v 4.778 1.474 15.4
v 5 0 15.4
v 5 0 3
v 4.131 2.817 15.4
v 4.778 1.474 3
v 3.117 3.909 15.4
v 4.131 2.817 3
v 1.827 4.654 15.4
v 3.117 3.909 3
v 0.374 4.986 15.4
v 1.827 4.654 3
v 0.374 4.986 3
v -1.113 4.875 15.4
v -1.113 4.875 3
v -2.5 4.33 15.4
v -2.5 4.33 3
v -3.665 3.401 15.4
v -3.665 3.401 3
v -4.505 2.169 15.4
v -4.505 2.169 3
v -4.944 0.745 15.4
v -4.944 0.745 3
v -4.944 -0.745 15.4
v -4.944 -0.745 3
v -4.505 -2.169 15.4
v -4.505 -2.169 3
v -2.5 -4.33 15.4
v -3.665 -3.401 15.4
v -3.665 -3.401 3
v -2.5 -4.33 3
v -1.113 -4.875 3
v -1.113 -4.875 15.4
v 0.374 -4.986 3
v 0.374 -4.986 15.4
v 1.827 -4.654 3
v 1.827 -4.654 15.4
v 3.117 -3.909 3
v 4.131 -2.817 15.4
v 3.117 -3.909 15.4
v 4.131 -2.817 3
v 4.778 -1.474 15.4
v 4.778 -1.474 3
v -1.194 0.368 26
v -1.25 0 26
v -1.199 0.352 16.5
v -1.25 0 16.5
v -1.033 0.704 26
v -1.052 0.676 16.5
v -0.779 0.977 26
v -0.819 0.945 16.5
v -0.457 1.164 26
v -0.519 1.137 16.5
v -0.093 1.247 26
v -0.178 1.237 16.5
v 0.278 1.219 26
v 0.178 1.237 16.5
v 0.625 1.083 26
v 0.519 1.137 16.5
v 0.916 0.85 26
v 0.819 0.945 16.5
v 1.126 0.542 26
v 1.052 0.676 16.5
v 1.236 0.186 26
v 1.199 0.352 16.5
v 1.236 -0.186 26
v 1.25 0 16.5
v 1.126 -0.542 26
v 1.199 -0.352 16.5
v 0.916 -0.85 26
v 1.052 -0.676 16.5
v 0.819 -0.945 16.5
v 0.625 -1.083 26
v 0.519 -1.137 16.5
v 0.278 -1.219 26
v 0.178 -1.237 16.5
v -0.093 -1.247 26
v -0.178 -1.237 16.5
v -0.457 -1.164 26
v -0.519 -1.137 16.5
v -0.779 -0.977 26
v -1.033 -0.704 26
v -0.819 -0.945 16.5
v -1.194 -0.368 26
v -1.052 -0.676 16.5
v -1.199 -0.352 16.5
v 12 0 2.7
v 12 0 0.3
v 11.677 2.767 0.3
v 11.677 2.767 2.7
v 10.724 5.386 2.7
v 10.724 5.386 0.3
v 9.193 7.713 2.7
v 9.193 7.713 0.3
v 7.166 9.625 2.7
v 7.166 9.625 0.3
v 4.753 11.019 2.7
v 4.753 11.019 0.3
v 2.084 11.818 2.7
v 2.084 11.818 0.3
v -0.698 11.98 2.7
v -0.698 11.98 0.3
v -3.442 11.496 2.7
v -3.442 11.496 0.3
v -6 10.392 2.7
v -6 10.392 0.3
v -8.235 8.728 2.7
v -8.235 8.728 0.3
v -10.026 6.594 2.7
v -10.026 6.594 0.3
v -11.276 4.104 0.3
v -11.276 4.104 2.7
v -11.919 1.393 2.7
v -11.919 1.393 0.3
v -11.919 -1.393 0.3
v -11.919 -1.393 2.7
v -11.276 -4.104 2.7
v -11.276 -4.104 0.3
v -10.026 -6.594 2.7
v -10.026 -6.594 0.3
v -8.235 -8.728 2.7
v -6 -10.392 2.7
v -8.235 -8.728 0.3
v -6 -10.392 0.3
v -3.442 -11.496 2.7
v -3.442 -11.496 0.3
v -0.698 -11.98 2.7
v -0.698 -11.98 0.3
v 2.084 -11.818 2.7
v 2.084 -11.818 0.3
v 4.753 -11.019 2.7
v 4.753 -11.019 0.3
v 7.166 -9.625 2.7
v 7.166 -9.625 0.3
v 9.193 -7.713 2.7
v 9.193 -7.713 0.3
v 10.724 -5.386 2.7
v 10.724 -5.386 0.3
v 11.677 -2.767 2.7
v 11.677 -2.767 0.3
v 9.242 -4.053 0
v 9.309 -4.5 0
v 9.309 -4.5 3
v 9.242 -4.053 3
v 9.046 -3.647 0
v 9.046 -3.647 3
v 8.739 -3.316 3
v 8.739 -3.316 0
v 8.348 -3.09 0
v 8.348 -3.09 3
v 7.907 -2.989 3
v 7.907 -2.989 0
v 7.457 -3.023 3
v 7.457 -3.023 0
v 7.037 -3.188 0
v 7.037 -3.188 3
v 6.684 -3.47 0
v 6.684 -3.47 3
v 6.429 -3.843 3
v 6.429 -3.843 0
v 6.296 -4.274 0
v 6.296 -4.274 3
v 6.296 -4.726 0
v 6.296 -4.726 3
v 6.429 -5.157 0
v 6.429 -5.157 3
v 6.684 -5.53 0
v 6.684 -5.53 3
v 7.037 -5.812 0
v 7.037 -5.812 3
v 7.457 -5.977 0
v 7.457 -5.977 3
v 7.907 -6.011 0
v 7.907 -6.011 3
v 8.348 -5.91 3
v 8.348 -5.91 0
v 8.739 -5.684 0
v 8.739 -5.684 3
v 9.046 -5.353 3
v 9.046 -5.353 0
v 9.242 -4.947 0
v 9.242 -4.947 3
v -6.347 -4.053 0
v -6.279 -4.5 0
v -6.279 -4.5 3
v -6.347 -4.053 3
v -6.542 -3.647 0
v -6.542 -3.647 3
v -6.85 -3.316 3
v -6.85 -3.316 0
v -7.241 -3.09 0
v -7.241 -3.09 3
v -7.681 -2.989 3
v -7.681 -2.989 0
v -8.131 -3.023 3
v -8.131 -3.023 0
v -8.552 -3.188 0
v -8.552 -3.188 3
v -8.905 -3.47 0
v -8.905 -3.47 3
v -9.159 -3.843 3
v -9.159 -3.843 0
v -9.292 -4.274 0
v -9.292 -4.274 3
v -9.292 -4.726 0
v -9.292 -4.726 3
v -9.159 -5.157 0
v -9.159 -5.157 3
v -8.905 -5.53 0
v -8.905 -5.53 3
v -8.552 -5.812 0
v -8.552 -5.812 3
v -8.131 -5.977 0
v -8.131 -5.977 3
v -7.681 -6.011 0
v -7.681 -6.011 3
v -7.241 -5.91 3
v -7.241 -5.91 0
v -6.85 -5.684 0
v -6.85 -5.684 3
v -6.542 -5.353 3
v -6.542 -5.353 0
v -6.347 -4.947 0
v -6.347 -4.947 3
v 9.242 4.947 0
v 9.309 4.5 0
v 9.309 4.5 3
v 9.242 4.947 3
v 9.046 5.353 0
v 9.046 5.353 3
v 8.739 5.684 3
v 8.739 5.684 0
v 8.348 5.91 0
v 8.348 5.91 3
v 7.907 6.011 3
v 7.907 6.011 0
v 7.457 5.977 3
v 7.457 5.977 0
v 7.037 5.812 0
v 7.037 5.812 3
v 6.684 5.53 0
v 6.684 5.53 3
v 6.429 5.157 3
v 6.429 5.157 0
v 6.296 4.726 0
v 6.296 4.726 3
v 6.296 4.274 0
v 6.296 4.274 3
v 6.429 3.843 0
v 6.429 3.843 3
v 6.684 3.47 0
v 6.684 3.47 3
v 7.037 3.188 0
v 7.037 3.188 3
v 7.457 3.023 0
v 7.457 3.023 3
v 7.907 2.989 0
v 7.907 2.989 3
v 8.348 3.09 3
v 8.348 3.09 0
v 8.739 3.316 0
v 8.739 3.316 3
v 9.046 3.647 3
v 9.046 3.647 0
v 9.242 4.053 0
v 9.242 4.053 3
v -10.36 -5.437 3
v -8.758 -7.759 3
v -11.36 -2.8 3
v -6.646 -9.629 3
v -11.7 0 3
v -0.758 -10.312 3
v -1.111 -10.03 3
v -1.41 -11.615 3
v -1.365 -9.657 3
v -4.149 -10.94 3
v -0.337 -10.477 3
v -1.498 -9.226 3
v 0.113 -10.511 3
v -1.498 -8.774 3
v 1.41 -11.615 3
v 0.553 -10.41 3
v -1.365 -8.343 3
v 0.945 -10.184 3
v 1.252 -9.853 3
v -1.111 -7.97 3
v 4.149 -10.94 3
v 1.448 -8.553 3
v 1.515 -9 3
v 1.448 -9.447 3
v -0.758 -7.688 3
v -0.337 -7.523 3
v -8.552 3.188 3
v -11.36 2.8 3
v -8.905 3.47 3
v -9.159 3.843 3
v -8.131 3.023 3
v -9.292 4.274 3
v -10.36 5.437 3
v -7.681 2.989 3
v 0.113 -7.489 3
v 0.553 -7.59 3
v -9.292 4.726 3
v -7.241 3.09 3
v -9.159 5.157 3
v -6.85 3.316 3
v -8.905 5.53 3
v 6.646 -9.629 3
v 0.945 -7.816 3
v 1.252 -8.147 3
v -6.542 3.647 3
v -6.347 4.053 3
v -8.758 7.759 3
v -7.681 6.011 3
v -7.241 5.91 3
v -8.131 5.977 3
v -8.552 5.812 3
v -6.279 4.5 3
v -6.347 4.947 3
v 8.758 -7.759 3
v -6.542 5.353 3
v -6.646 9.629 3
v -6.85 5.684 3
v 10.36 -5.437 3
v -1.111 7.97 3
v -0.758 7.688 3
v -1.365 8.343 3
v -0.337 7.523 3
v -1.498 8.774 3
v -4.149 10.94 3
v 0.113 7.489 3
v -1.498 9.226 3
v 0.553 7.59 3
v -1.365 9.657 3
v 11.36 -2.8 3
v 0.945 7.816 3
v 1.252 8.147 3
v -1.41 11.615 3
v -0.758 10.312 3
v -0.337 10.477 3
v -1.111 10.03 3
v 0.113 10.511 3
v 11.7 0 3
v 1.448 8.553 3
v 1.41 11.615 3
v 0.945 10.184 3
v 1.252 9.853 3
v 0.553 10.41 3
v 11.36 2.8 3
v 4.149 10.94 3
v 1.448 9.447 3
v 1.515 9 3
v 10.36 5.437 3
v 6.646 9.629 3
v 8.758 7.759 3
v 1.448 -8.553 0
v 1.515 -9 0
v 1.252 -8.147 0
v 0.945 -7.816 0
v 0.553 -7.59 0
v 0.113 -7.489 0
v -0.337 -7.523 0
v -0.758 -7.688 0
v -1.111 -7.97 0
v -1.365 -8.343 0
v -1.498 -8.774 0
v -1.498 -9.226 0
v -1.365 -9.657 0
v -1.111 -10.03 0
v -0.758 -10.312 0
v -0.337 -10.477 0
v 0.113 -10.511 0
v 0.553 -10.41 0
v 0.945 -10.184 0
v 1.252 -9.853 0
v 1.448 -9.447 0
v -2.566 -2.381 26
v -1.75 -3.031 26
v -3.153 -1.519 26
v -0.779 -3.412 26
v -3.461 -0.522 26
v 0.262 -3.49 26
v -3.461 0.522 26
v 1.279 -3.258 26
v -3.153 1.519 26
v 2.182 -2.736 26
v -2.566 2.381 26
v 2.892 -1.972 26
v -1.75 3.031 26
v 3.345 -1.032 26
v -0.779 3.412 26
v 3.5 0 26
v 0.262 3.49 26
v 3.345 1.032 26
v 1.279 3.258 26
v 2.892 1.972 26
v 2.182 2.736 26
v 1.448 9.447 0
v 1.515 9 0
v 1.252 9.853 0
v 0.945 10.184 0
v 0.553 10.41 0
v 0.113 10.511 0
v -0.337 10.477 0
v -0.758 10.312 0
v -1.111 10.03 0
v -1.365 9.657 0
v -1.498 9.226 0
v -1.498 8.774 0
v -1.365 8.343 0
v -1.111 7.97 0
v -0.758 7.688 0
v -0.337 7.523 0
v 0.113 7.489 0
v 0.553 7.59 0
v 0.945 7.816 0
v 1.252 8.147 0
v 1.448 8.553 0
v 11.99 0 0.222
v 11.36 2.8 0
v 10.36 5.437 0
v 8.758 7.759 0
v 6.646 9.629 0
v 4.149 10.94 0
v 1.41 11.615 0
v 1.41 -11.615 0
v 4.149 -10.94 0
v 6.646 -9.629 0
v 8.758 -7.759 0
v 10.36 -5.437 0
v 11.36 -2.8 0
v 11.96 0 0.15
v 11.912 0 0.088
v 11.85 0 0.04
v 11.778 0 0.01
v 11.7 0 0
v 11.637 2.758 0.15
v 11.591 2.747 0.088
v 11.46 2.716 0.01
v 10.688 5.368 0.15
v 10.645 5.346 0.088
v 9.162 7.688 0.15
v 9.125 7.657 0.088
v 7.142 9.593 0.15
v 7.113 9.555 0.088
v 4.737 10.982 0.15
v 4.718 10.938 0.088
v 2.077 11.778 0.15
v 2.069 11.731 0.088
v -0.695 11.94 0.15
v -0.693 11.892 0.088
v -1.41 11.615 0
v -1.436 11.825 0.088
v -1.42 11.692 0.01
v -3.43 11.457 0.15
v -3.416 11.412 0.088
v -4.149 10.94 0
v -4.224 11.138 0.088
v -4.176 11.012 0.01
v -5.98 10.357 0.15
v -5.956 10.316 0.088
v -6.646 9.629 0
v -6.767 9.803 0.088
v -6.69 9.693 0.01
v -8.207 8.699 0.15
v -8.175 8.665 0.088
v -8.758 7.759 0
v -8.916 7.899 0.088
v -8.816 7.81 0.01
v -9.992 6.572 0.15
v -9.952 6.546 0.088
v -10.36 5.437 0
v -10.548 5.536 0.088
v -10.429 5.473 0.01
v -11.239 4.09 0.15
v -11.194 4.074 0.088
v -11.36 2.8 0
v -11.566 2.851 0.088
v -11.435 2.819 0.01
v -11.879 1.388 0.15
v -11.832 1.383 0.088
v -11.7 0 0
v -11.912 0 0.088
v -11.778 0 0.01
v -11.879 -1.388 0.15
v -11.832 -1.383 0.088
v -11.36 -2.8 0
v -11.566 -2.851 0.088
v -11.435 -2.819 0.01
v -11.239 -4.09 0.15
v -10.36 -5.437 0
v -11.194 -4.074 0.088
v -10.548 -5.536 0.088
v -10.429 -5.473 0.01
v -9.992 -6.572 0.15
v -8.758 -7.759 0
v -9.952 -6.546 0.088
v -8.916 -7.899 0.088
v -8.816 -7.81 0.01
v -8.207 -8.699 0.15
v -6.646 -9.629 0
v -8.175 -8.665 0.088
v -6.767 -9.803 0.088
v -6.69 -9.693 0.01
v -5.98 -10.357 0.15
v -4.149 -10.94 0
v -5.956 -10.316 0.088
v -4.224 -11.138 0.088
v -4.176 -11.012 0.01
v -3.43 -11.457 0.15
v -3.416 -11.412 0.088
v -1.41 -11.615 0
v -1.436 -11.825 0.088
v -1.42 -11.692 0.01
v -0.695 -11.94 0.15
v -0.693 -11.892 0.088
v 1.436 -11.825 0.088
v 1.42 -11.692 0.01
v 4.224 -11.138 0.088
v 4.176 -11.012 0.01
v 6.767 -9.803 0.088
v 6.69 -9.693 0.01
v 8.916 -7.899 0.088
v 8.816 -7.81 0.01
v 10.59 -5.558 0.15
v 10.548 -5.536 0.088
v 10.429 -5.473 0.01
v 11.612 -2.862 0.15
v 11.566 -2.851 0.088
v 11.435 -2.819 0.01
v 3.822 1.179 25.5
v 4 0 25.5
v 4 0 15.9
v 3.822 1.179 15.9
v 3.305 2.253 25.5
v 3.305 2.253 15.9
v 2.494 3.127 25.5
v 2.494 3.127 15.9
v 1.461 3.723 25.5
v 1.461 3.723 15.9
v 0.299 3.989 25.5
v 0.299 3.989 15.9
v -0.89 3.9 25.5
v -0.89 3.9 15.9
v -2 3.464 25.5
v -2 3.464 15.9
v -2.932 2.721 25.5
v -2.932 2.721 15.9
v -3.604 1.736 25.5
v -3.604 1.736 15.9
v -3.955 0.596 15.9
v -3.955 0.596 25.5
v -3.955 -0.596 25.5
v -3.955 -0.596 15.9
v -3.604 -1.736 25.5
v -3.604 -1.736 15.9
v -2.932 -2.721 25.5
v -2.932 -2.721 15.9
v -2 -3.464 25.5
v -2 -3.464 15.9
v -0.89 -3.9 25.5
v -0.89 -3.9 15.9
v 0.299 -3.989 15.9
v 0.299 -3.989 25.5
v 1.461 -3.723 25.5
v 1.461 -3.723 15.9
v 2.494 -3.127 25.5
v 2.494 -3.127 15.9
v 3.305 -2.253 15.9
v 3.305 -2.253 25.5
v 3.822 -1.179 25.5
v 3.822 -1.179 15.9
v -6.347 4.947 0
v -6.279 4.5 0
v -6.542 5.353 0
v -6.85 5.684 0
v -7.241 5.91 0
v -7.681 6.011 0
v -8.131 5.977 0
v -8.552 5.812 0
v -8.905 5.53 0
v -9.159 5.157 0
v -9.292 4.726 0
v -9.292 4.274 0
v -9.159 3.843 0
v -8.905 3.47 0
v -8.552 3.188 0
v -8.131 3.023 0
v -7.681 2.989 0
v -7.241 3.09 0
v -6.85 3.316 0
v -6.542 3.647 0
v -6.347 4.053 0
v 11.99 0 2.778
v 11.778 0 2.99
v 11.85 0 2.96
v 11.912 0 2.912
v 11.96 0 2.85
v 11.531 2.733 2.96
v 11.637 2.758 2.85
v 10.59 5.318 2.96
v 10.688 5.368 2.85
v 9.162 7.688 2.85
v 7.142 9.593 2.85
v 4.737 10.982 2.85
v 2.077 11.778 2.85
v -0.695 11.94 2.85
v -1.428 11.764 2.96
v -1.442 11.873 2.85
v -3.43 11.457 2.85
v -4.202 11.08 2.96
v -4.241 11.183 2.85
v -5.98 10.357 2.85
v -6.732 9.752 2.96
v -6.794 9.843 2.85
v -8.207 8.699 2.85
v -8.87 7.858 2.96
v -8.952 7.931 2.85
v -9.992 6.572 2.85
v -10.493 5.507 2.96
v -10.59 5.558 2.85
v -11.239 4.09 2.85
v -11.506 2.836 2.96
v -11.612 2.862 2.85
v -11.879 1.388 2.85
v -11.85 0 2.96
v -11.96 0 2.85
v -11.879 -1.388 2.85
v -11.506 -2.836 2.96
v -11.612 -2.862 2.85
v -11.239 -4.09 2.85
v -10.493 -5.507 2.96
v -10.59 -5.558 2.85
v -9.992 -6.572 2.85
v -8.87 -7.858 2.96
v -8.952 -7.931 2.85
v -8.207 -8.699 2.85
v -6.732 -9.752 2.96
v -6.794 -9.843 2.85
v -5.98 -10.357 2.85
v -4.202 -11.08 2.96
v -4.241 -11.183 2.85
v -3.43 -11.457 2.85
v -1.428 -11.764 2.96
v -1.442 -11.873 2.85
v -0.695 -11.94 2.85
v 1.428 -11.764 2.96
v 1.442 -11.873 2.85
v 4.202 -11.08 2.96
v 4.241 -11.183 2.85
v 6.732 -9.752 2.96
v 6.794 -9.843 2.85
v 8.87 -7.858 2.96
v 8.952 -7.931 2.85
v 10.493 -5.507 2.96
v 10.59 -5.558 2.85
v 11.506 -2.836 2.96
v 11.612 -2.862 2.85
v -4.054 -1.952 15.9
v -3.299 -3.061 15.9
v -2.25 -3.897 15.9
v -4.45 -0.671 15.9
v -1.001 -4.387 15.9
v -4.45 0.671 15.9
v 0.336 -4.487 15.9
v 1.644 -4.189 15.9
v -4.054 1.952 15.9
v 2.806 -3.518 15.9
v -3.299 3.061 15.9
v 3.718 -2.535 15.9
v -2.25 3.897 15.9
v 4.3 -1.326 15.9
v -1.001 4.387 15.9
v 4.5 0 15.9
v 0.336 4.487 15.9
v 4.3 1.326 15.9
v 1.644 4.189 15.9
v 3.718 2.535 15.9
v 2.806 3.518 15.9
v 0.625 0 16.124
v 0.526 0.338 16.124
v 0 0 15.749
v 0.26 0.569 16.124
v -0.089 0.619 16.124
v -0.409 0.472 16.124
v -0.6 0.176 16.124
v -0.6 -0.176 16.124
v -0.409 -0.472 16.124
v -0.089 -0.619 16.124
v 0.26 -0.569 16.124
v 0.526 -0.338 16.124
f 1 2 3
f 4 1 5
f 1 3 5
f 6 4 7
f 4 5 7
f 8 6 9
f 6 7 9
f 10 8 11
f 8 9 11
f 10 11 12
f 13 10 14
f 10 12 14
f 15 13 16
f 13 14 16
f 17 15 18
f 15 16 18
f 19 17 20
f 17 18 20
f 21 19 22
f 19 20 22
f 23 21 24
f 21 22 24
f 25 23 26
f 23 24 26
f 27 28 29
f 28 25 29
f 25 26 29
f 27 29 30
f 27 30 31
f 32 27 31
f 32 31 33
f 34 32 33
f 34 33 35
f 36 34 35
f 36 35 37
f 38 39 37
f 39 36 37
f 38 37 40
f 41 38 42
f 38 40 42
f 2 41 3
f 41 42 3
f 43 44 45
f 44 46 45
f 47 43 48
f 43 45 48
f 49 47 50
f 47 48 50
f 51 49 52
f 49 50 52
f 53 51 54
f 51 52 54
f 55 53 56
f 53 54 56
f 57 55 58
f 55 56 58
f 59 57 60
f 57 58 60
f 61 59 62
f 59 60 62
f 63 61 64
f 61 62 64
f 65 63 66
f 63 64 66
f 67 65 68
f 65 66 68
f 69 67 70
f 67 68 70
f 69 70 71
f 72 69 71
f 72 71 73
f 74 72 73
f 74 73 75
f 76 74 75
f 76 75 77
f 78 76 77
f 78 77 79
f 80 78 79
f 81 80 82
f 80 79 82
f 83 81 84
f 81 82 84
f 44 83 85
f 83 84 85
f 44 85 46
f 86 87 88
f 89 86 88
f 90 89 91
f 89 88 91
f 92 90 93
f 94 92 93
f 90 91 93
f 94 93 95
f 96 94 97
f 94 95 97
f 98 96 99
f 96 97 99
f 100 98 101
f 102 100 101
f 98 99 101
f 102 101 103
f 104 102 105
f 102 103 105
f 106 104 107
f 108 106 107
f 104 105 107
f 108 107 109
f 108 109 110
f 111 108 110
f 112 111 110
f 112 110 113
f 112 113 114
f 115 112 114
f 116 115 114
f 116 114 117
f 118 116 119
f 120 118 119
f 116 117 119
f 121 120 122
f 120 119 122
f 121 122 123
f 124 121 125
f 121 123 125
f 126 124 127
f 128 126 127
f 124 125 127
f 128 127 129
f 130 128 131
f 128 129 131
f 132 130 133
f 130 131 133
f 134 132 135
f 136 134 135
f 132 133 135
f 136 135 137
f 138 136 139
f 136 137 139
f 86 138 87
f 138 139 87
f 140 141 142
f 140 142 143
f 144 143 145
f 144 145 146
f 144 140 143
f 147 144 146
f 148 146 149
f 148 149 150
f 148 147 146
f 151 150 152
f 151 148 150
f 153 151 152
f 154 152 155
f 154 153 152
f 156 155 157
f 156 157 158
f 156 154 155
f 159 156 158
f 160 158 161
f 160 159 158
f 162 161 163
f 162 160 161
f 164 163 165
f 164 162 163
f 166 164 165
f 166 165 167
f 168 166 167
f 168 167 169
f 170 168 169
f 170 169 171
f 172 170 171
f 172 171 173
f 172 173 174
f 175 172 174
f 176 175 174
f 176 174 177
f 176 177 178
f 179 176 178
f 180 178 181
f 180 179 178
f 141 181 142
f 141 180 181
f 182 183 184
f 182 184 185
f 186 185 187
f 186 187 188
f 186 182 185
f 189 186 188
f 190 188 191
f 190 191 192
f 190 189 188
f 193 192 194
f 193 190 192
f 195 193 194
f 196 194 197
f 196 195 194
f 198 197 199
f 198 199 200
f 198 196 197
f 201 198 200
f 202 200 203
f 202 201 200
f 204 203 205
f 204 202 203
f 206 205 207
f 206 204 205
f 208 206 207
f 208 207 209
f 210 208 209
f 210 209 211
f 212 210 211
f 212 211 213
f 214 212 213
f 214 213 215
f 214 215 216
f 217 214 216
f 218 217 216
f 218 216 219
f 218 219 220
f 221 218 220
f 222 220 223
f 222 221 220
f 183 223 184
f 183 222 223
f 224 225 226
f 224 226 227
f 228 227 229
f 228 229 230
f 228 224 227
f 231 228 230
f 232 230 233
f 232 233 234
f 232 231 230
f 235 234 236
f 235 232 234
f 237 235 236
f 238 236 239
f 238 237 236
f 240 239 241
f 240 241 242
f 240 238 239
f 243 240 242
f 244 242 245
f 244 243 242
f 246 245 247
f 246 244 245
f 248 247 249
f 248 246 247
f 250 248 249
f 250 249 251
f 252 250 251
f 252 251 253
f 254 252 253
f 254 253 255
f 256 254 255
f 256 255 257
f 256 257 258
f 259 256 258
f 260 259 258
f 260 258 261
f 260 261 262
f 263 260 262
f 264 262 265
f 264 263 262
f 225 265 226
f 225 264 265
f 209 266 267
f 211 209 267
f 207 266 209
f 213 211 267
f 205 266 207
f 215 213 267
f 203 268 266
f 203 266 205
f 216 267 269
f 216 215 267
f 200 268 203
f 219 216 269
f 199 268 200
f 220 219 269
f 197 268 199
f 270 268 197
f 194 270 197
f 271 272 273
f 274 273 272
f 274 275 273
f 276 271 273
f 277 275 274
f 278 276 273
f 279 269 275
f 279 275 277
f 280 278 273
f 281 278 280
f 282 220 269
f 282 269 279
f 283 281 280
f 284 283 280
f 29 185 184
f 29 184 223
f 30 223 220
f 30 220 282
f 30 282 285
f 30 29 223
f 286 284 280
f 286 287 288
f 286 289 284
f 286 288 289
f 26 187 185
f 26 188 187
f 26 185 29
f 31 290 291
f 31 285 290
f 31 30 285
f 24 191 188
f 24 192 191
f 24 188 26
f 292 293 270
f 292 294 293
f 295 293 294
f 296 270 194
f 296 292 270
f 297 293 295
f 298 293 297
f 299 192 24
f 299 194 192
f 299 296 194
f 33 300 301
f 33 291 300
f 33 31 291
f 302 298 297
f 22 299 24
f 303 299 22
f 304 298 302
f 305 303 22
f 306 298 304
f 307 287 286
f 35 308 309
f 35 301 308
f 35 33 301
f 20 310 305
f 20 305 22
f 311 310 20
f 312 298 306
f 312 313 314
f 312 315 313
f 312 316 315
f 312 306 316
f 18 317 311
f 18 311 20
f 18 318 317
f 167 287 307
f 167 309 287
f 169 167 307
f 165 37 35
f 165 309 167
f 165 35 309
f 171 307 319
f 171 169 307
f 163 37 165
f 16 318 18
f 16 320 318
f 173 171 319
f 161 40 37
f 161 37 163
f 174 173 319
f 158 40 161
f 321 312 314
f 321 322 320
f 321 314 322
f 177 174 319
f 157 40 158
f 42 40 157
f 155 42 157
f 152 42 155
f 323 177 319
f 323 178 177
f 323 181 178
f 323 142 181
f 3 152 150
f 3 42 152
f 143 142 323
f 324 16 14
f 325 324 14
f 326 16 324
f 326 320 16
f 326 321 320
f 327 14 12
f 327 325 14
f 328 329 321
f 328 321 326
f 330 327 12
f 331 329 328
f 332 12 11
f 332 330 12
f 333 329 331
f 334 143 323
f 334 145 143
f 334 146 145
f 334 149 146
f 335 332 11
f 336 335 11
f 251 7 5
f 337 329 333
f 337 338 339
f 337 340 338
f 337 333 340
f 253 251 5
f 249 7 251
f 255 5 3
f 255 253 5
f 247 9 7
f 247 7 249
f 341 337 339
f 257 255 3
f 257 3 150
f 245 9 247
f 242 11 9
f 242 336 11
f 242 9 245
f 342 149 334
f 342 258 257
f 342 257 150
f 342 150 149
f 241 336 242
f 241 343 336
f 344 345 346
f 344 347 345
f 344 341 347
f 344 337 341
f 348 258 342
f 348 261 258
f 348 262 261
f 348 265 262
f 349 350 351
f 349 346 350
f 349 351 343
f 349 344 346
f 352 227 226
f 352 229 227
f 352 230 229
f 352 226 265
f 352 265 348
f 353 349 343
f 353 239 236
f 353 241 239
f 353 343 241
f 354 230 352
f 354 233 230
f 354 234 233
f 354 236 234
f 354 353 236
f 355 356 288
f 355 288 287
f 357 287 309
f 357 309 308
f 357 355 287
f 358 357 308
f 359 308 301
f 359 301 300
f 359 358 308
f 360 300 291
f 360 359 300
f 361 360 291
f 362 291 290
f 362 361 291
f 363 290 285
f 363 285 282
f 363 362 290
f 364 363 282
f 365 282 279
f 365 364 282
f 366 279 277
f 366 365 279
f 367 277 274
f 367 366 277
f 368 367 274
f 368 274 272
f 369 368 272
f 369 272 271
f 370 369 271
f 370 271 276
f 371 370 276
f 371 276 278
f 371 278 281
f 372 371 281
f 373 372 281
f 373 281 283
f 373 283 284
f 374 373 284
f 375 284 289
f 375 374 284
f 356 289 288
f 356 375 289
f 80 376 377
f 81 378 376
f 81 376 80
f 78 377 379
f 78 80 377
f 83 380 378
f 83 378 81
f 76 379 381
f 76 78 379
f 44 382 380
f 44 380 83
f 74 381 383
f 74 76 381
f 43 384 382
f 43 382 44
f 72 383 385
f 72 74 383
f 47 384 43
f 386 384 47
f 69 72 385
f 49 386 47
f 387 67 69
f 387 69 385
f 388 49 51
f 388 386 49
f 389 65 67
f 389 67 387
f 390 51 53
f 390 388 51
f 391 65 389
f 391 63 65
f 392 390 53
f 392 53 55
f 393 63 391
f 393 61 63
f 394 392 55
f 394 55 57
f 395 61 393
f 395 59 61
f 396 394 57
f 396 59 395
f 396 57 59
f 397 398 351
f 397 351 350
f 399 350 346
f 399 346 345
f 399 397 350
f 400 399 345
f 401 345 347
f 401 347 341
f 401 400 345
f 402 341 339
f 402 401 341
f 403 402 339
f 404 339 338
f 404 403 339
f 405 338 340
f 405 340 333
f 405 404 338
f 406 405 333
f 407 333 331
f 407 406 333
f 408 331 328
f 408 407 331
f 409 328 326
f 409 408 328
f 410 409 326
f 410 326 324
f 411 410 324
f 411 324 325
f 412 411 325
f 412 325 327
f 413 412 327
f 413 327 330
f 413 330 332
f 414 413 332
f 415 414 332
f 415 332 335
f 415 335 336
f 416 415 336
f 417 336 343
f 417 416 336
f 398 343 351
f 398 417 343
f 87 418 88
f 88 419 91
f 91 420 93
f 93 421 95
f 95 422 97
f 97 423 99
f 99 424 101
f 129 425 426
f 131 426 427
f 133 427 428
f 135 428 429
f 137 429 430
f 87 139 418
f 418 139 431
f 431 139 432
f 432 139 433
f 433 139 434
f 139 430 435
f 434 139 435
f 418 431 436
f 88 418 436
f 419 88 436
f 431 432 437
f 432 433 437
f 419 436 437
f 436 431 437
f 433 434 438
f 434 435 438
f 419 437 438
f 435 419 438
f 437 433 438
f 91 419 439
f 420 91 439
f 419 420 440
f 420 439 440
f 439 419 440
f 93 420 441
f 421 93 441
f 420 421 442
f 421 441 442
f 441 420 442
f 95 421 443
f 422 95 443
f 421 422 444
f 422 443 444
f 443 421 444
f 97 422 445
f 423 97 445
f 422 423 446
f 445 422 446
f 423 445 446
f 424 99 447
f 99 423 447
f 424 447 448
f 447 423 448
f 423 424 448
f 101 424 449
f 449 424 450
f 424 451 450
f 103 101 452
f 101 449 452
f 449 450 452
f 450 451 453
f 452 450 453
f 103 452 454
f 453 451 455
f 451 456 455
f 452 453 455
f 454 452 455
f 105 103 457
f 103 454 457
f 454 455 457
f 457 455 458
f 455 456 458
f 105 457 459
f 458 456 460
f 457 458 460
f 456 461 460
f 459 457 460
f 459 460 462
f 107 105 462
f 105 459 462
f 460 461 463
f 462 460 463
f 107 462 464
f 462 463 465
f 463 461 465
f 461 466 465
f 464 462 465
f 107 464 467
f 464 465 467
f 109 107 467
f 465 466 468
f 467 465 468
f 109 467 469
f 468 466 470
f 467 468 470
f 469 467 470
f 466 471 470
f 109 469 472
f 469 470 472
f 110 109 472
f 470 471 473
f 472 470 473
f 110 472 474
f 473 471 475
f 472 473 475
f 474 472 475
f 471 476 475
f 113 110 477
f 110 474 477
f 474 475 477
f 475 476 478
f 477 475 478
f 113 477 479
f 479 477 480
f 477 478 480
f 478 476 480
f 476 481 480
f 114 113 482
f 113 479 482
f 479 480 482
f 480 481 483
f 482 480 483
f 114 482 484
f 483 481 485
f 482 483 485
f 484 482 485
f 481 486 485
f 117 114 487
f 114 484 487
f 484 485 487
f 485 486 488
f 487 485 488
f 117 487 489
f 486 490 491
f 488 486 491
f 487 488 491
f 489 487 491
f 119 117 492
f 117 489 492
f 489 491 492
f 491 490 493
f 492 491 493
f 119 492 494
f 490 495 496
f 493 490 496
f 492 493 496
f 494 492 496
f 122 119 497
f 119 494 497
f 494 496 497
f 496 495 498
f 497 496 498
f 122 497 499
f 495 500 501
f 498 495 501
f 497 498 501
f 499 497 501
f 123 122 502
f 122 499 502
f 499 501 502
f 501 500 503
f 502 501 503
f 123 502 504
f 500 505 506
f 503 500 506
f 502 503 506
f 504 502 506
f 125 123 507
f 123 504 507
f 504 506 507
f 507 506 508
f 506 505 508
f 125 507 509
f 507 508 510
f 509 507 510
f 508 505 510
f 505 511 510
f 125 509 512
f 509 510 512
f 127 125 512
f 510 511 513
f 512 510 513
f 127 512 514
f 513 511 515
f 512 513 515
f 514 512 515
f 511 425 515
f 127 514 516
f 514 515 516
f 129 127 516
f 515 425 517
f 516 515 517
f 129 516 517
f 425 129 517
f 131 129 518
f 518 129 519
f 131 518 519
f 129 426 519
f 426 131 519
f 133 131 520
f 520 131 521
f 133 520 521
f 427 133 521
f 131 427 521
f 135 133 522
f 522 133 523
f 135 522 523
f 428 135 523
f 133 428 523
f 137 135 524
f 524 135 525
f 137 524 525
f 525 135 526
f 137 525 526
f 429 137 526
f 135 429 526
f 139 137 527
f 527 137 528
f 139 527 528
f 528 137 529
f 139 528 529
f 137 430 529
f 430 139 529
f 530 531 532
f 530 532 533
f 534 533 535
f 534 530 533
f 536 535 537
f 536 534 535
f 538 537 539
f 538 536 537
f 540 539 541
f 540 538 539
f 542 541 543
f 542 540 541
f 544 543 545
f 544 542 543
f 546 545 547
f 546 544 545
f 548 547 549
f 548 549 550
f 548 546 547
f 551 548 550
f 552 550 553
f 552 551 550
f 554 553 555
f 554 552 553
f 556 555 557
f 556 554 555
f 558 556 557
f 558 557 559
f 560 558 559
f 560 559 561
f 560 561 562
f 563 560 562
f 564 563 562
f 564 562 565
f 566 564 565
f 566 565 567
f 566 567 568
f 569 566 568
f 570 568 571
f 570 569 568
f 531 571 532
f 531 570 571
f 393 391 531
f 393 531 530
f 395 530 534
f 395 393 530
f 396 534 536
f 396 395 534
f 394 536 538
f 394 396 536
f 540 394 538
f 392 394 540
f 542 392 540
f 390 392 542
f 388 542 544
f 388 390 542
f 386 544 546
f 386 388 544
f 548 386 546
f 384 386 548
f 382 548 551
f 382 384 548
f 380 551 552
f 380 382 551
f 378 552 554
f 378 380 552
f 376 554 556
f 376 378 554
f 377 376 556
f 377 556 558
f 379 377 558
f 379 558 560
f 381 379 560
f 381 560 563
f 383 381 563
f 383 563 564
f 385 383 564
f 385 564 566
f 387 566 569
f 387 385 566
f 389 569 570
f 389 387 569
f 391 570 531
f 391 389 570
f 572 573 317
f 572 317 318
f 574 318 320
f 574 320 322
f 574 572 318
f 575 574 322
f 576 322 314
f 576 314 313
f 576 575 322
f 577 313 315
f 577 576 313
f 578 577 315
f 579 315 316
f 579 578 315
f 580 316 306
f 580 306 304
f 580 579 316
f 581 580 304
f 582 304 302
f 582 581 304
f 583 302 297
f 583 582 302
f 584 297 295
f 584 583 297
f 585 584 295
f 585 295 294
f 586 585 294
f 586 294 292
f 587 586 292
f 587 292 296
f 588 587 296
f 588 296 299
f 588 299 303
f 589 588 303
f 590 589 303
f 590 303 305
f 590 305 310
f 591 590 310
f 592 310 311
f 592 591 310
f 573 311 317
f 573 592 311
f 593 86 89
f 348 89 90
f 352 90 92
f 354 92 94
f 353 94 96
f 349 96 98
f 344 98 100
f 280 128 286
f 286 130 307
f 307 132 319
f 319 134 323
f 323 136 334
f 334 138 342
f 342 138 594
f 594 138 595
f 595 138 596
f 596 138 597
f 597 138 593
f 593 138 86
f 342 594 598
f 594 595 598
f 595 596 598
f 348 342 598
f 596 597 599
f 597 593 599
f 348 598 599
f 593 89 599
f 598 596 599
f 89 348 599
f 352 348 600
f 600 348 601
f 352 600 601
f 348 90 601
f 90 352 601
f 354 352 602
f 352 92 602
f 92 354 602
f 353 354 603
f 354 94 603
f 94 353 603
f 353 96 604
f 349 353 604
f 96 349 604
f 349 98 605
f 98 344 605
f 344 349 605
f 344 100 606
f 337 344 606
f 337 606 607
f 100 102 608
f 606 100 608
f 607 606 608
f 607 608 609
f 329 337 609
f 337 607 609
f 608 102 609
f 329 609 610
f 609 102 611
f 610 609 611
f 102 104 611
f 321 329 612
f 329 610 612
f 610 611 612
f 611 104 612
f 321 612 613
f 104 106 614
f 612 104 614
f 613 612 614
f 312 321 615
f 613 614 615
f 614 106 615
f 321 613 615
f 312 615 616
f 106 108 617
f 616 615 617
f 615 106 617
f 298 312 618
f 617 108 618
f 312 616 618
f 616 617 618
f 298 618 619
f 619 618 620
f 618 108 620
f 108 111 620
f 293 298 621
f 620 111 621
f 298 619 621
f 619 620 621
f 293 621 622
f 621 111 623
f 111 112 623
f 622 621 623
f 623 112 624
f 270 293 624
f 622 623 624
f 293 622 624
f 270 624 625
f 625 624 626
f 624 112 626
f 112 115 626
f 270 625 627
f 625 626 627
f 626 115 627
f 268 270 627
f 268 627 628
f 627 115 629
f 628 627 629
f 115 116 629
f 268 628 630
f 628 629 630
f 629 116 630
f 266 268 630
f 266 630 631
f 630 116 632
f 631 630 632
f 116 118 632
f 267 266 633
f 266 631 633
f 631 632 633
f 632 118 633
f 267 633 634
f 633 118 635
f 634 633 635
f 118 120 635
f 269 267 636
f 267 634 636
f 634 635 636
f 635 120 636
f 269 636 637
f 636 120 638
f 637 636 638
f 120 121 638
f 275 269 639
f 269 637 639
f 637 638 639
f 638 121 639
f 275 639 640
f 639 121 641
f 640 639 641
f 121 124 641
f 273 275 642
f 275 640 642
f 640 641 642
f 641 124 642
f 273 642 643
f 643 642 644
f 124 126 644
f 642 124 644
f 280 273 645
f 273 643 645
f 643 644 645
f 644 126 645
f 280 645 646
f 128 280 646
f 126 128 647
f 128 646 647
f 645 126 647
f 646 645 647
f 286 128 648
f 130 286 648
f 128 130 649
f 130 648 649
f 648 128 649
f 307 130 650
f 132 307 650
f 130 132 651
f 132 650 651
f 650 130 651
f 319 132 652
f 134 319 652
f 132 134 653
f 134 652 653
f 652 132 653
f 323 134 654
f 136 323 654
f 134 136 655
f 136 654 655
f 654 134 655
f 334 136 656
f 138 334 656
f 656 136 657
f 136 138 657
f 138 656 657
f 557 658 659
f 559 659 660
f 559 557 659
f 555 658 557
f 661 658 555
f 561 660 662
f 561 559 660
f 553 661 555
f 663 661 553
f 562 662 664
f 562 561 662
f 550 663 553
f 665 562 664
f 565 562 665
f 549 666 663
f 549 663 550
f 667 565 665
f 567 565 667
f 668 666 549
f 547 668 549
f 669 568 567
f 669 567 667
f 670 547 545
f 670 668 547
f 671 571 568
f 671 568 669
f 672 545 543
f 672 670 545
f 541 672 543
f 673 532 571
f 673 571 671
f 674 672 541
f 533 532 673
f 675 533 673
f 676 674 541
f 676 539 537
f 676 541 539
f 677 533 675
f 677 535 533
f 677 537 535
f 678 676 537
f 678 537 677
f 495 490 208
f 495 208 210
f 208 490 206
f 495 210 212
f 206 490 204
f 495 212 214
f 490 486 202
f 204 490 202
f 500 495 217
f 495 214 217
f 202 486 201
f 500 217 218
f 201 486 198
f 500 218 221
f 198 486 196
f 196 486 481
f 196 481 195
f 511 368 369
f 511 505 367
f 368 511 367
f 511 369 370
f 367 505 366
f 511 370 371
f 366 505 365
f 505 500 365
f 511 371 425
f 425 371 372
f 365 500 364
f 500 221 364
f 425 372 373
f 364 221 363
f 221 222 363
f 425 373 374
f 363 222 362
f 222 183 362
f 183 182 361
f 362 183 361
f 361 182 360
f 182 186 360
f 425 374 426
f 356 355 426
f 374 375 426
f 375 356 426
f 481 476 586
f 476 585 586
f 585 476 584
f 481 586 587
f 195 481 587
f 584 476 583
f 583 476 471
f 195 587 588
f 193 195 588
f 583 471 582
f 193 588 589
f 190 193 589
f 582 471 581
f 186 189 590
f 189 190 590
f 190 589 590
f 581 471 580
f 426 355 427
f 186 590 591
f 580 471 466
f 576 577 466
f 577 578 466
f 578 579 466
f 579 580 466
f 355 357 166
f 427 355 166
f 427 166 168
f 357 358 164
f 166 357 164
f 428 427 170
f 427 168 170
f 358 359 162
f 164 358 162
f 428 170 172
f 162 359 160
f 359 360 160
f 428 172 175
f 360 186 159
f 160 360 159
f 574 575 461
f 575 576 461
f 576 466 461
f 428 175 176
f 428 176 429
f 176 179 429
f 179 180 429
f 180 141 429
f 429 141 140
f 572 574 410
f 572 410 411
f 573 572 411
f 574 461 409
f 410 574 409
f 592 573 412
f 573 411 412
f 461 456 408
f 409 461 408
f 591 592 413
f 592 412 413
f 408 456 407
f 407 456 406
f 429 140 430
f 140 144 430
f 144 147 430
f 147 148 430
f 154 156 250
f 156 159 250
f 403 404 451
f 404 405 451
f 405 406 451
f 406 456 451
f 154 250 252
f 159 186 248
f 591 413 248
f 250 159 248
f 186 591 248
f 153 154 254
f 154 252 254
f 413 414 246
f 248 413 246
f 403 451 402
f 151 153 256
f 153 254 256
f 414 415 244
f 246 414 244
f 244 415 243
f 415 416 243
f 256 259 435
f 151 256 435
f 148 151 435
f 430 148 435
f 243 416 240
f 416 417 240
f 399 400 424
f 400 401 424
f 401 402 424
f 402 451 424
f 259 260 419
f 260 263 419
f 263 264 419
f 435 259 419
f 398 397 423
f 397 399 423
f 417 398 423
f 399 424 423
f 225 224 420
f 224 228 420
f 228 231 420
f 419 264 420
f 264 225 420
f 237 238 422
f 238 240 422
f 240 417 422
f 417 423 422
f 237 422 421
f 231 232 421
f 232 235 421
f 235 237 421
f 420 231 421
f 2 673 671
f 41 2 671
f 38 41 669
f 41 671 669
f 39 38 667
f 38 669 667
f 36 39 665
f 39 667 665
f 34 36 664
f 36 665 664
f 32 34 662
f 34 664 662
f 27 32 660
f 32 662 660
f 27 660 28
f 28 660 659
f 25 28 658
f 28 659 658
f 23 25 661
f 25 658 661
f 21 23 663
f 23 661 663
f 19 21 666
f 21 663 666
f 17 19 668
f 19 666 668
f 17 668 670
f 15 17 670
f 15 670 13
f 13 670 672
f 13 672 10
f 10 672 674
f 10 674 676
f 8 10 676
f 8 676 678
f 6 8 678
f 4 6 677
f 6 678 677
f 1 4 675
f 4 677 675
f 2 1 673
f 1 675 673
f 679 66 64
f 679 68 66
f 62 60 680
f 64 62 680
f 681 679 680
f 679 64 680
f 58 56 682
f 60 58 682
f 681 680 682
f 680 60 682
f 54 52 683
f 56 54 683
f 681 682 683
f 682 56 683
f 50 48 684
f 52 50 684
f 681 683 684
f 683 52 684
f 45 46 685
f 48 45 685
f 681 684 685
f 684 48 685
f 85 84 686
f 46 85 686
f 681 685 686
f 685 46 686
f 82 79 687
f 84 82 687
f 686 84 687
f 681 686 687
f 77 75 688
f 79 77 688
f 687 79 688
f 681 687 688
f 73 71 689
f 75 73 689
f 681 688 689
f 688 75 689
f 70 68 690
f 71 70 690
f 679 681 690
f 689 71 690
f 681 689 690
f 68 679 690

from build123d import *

# Parameters (mm, degrees)
SKETCH_1_R             = 12
SKETCH_1_R_2           = 1.515
EXTRUDE_1_DEPTH        = 3
SKETCH_2_R             = 5
EXTRUDE_2_DEPTH        = 23
SKETCH_3_OUTSIDE_W     = 34.552
SKETCH_3_OUTSIDE_H     = 34.552
SKETCH_3_OUTSIDE_R     = 4
CUT_EXTRUDE_1_DEPTH    = 10.1
CHAMFER_1_SIZE         = 0.5
FILLET_1_R             = 0.3
HOLE_WIZARD_M3_1_D     = 2.5
HOLE_WIZARD_M3_1_DEPTH = 9.5
HOLE_WIZARD_M3_1_TIP   = 0.751075774


with BuildPart() as part:
    # 草图1 → 凸台-拉伸1 (new body)
    with BuildSketch(Plane.XY):
        Circle(SKETCH_1_R)
        with Locations((0, 9)):
            Circle(SKETCH_1_R_2, mode=Mode.SUBTRACT)
        with Locations((7.794228634, 4.5)):
            Circle(SKETCH_1_R_2, mode=Mode.SUBTRACT)
        with Locations((7.794228634, -4.5)):
            Circle(SKETCH_1_R_2, mode=Mode.SUBTRACT)
        with Locations((0, -9)):
            Circle(SKETCH_1_R_2, mode=Mode.SUBTRACT)
        with Locations((-7.794228634, -4.5)):
            Circle(SKETCH_1_R_2, mode=Mode.SUBTRACT)
        with Locations((-7.794228634, 4.5)):
            Circle(SKETCH_1_R_2, mode=Mode.SUBTRACT)
    extrude(amount=EXTRUDE_1_DEPTH)

    # 草图2 → 凸台-拉伸2 (add)
    with BuildSketch(Plane.XY.offset(3)):
        Circle(SKETCH_2_R)
    extrude(amount=EXTRUDE_2_DEPTH)

    # 草图3 outside → 切除-拉伸1 (cut)
    with BuildSketch(Plane.XY.offset(26)):
        Rectangle(SKETCH_3_OUTSIDE_W, SKETCH_3_OUTSIDE_H)
        Circle(SKETCH_3_OUTSIDE_R, mode=Mode.SUBTRACT)
    extrude(amount=-CUT_EXTRUDE_1_DEPTH, mode=Mode.SUBTRACT)

    # 倒角1
    chamfer_1_edges = [part.edges().sort_by_distance(p)[0] for p in [
        (-4, 0, 26),
        (-5, 0, 15.9),
    ]]
    chamfer(chamfer_1_edges, length=CHAMFER_1_SIZE)

    # 圆角1
    fillet_1_edges = [part.edges().sort_by_distance(p)[0] for p in [
        (-12, 0, 0),
        (-12, 0, 3),
    ]]
    fillet(fillet_1_edges, radius=FILLET_1_R)

    # M3 螺纹孔1
    with Locations(Plane.XY.offset(26)):
        with Locations((0, 0)):
            Hole(HOLE_WIZARD_M3_1_D / 2, depth=HOLE_WIZARD_M3_1_DEPTH)
            with Locations((0, 0, -(HOLE_WIZARD_M3_1_DEPTH + HOLE_WIZARD_M3_1_TIP / 2))):  # 118° drill point
                Cone(0, HOLE_WIZARD_M3_1_D / 2, HOLE_WIZARD_M3_1_TIP, mode=Mode.SUBTRACT)


solid = part.part
